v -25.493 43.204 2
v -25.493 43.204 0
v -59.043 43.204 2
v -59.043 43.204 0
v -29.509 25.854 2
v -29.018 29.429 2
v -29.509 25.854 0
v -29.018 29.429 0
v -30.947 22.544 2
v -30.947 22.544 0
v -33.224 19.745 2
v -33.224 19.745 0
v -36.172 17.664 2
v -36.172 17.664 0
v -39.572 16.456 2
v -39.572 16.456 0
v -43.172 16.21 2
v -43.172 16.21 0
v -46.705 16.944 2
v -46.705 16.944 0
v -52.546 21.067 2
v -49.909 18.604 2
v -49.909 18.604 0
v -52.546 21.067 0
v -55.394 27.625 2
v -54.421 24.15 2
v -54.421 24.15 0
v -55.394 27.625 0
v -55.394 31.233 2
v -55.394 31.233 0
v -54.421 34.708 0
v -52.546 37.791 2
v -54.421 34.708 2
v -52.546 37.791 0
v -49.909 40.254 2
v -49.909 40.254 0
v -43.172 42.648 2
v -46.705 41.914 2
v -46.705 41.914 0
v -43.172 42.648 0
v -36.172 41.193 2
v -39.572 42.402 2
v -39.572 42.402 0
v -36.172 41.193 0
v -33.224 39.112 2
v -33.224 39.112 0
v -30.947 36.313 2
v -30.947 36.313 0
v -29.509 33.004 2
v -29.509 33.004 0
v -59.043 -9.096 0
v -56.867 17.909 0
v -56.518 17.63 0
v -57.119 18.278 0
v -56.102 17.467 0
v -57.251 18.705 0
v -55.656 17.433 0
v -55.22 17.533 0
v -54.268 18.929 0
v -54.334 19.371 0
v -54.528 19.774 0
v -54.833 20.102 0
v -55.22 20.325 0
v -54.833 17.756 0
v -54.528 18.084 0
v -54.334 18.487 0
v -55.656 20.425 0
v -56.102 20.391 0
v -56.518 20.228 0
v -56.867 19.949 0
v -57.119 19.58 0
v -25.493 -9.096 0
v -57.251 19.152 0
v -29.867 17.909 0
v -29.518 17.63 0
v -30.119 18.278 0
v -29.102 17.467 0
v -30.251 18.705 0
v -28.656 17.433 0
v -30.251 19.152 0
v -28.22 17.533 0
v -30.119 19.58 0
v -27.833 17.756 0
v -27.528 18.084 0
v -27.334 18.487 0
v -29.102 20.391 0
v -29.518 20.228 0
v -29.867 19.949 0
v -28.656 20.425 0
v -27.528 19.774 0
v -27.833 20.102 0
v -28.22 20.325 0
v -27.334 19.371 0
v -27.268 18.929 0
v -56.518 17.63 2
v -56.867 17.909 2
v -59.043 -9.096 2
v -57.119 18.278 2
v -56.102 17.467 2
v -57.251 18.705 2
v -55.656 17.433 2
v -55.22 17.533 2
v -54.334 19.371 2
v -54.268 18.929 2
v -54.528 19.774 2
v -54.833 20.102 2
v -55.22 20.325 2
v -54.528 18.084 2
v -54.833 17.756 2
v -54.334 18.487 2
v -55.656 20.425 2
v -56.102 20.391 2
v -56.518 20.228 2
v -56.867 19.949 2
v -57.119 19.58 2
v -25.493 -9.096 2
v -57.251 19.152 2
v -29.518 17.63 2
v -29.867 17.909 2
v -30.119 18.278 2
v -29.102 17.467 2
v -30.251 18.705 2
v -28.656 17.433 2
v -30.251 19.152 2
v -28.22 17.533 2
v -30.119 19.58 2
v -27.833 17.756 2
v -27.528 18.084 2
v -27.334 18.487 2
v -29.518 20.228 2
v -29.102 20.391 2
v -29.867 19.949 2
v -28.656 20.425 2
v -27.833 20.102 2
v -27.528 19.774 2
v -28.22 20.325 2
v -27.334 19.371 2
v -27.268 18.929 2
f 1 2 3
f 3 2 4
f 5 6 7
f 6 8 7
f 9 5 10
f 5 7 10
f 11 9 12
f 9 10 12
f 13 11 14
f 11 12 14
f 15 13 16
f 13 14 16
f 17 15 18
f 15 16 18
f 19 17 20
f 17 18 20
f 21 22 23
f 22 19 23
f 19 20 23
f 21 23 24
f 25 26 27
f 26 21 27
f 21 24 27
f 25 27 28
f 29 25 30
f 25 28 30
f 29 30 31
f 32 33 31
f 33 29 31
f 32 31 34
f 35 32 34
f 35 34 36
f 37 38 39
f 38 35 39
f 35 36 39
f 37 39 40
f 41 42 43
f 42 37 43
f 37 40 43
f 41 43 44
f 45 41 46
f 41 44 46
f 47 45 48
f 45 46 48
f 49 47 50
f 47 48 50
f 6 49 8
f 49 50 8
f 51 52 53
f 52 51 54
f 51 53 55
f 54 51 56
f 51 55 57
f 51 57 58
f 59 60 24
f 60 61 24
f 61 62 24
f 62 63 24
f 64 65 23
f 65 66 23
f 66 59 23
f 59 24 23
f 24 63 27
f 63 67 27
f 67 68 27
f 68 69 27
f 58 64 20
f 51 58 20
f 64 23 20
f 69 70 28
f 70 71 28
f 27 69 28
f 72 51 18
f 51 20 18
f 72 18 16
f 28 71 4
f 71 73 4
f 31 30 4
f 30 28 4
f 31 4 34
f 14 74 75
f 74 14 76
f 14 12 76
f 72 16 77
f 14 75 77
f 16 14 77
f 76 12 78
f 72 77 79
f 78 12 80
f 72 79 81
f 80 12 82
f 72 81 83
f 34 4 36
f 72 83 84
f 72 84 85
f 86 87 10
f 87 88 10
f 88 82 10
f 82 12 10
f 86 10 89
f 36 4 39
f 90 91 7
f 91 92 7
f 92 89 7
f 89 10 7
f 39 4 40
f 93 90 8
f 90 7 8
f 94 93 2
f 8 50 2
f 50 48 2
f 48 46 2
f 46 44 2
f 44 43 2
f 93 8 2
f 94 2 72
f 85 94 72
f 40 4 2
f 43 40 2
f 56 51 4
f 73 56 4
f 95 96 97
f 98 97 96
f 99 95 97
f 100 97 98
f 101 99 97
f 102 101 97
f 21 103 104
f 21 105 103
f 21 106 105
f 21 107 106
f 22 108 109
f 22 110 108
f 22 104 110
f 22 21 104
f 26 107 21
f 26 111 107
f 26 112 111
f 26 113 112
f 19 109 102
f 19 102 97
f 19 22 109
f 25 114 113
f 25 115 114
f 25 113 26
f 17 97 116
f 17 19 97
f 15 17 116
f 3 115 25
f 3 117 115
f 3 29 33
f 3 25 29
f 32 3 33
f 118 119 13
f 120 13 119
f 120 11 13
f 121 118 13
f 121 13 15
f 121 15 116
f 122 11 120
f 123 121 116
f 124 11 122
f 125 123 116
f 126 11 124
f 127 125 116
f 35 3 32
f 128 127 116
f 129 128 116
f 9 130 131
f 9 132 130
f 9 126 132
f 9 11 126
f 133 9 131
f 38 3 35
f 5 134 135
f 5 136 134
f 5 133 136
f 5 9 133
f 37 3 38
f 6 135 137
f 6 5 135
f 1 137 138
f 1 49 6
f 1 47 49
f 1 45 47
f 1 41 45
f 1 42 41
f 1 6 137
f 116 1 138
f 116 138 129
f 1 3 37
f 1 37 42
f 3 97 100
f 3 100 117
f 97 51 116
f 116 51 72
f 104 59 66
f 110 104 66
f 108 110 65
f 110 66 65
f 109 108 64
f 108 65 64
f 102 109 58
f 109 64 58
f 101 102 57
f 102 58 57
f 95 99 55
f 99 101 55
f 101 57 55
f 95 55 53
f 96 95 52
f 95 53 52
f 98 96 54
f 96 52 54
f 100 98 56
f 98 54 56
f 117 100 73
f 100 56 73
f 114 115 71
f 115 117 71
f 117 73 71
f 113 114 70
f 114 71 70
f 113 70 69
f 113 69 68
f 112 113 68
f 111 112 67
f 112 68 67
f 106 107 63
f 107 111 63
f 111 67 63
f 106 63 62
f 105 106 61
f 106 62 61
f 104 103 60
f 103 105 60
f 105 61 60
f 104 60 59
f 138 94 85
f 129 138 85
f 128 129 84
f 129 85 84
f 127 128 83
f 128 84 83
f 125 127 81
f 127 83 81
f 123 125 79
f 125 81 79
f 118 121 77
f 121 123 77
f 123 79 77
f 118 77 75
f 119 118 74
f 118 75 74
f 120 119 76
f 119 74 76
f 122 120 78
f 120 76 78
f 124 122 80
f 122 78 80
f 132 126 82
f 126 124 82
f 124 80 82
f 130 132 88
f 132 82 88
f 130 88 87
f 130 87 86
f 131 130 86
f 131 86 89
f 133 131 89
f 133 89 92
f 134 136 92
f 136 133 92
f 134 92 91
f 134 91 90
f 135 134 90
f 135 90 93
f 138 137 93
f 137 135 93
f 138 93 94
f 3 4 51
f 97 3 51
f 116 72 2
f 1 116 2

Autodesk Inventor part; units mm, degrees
ref_plane "YZ Plane" through (0, 0, 0) normal (1, 0, 0) x (0, 1, 0)
ref_plane "XZ Plane" through (0, 0, 0) normal (0, 1, 0) x (-1, 0, 0)
ref_plane "XY Plane" through (0, 0, 0) normal (0, 0, 1) x (1, 0, 0)
sketch "Sketch2" plane through (0, 0, 0) normal (0, 0, 1) x (1, 0, 0)
  circle A0 centre (-42.2678, 29.4289) radius 13.25
  line L0 (-25.4928, 43.2039) -> (-59.0428, 43.2039)
  line L1 (-25.4928, -9.0961) -> (-25.4928, 43.2039)
  line L2 (-59.0428, 43.2039) -> (-59.0428, -9.0961)
  line L3 (-59.0428, -9.0961) -> (-25.4928, -9.0961)
  line L4 (-25.4928, -9.0961) -> (-25.4928, 43.2039)
  line L5 (-59.0428, -9.0961) -> (-25.4928, -9.0961)
  circle A1 centre (-55.7678, 18.9289) radius 1.5
  circle A2 centre (-28.7678, 18.9289) radius 1.5
  point P0 (0, 0)
  point P1 (-25.4928, -10.1461)
  dimension "d10" = 26.5
  dimension "d11" = 13.775
  dimension "d12" = 16.775
  dimension "d14" = 3
  dimension "d15" = 10.5
  dimension "d16" = 3
  dimension "d17" = 27
  dimension "d18" = 10.5
  dimension "d19" = 3.275
  dimension "d22" = 52.3
extrude "Extrusion1" add sketch "Sketch2" along normal blind 2
properties part number "Motor_Cover_2"
